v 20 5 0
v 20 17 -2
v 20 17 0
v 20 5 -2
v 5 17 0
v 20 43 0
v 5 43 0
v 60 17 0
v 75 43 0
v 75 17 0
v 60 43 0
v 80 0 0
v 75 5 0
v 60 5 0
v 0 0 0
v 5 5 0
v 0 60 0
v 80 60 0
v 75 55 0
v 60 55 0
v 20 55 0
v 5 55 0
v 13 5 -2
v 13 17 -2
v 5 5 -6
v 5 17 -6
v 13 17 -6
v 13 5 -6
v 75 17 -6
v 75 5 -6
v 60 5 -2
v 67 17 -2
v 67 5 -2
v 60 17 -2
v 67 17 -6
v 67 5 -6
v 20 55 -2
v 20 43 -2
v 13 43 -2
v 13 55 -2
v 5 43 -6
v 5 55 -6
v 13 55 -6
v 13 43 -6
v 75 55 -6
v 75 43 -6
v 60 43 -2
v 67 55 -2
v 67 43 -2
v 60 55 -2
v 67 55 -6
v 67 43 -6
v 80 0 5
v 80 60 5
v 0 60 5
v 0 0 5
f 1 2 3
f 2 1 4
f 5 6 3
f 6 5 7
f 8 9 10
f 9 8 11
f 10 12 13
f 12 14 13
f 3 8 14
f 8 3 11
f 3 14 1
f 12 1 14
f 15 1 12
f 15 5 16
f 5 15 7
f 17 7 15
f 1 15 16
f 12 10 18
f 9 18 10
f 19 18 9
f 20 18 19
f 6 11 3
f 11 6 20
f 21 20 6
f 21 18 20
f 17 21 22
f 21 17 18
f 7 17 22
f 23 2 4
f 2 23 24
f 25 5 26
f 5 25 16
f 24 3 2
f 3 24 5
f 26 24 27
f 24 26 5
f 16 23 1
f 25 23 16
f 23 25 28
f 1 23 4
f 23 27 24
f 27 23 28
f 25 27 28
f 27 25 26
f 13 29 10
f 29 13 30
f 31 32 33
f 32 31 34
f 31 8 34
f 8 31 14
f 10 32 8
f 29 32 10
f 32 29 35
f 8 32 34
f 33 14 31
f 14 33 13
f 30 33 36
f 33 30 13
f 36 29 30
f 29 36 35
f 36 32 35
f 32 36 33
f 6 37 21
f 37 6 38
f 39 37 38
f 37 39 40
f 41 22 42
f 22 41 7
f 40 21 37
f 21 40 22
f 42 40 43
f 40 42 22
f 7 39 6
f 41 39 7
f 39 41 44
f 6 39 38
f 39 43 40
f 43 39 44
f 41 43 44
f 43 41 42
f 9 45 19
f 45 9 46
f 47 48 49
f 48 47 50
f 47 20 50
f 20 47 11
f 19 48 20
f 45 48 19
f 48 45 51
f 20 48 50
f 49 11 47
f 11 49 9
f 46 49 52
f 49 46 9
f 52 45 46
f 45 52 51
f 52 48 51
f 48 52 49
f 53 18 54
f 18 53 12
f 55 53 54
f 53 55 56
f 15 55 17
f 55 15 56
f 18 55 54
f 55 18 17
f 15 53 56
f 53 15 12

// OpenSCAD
// Main slab dimensions
slab_width = 80;
slab_depth = 60;
slab_height = 5;

// Shallow pad dimensions
pad_width = 15;
pad_depth = 12;
pad_height = 2;

// Deeper continuation dimensions
deep_width = 8;
deep_height = 4;  // additional depth below the shallow pad

// Positioning insets from slab edges
pad_inset_x = 5;
pad_inset_y = 5;

// Resolution
$fn = 50;

// Main rectangular slab, bottom at z = 0
module main_slab() {
    cube([slab_width, slab_depth, slab_height]);
}

// Two-tier underside protrusion
// px, py: lower-left corner of the shallow pad footprint
// align_right: if true, deep block aligns to pad's right edge; else left
module two_tier_pad(px, py, align_right) {
    // Shallow pad attached to slab underside
    translate([px, py, -pad_height])
        cube([pad_width, pad_depth, pad_height]);

    // Deeper continuation, narrower, sharing front/back edges
    dx = align_right ? px + pad_width - deep_width : px;
    translate([dx, py, -(pad_height + deep_height)])
        cube([deep_width, pad_depth, deep_height]);
}

// Build model
union() {
    main_slab();

    // Front-left pad, deep aligned to left edge
    two_tier_pad(pad_inset_x, pad_inset_y, false);

    // Front-right pad, deep aligned to right edge
    two_tier_pad(slab_width - pad_inset_x - pad_width, pad_inset_y, true);

    // Back-left pad, deep aligned to left edge
    two_tier_pad(pad_inset_x, slab_depth - pad_inset_y - pad_depth, false);

    // Back-right pad, deep aligned to right edge
    two_tier_pad(slab_width - pad_inset_x - pad_width, slab_depth - pad_inset_y - pad_depth, true);
}
